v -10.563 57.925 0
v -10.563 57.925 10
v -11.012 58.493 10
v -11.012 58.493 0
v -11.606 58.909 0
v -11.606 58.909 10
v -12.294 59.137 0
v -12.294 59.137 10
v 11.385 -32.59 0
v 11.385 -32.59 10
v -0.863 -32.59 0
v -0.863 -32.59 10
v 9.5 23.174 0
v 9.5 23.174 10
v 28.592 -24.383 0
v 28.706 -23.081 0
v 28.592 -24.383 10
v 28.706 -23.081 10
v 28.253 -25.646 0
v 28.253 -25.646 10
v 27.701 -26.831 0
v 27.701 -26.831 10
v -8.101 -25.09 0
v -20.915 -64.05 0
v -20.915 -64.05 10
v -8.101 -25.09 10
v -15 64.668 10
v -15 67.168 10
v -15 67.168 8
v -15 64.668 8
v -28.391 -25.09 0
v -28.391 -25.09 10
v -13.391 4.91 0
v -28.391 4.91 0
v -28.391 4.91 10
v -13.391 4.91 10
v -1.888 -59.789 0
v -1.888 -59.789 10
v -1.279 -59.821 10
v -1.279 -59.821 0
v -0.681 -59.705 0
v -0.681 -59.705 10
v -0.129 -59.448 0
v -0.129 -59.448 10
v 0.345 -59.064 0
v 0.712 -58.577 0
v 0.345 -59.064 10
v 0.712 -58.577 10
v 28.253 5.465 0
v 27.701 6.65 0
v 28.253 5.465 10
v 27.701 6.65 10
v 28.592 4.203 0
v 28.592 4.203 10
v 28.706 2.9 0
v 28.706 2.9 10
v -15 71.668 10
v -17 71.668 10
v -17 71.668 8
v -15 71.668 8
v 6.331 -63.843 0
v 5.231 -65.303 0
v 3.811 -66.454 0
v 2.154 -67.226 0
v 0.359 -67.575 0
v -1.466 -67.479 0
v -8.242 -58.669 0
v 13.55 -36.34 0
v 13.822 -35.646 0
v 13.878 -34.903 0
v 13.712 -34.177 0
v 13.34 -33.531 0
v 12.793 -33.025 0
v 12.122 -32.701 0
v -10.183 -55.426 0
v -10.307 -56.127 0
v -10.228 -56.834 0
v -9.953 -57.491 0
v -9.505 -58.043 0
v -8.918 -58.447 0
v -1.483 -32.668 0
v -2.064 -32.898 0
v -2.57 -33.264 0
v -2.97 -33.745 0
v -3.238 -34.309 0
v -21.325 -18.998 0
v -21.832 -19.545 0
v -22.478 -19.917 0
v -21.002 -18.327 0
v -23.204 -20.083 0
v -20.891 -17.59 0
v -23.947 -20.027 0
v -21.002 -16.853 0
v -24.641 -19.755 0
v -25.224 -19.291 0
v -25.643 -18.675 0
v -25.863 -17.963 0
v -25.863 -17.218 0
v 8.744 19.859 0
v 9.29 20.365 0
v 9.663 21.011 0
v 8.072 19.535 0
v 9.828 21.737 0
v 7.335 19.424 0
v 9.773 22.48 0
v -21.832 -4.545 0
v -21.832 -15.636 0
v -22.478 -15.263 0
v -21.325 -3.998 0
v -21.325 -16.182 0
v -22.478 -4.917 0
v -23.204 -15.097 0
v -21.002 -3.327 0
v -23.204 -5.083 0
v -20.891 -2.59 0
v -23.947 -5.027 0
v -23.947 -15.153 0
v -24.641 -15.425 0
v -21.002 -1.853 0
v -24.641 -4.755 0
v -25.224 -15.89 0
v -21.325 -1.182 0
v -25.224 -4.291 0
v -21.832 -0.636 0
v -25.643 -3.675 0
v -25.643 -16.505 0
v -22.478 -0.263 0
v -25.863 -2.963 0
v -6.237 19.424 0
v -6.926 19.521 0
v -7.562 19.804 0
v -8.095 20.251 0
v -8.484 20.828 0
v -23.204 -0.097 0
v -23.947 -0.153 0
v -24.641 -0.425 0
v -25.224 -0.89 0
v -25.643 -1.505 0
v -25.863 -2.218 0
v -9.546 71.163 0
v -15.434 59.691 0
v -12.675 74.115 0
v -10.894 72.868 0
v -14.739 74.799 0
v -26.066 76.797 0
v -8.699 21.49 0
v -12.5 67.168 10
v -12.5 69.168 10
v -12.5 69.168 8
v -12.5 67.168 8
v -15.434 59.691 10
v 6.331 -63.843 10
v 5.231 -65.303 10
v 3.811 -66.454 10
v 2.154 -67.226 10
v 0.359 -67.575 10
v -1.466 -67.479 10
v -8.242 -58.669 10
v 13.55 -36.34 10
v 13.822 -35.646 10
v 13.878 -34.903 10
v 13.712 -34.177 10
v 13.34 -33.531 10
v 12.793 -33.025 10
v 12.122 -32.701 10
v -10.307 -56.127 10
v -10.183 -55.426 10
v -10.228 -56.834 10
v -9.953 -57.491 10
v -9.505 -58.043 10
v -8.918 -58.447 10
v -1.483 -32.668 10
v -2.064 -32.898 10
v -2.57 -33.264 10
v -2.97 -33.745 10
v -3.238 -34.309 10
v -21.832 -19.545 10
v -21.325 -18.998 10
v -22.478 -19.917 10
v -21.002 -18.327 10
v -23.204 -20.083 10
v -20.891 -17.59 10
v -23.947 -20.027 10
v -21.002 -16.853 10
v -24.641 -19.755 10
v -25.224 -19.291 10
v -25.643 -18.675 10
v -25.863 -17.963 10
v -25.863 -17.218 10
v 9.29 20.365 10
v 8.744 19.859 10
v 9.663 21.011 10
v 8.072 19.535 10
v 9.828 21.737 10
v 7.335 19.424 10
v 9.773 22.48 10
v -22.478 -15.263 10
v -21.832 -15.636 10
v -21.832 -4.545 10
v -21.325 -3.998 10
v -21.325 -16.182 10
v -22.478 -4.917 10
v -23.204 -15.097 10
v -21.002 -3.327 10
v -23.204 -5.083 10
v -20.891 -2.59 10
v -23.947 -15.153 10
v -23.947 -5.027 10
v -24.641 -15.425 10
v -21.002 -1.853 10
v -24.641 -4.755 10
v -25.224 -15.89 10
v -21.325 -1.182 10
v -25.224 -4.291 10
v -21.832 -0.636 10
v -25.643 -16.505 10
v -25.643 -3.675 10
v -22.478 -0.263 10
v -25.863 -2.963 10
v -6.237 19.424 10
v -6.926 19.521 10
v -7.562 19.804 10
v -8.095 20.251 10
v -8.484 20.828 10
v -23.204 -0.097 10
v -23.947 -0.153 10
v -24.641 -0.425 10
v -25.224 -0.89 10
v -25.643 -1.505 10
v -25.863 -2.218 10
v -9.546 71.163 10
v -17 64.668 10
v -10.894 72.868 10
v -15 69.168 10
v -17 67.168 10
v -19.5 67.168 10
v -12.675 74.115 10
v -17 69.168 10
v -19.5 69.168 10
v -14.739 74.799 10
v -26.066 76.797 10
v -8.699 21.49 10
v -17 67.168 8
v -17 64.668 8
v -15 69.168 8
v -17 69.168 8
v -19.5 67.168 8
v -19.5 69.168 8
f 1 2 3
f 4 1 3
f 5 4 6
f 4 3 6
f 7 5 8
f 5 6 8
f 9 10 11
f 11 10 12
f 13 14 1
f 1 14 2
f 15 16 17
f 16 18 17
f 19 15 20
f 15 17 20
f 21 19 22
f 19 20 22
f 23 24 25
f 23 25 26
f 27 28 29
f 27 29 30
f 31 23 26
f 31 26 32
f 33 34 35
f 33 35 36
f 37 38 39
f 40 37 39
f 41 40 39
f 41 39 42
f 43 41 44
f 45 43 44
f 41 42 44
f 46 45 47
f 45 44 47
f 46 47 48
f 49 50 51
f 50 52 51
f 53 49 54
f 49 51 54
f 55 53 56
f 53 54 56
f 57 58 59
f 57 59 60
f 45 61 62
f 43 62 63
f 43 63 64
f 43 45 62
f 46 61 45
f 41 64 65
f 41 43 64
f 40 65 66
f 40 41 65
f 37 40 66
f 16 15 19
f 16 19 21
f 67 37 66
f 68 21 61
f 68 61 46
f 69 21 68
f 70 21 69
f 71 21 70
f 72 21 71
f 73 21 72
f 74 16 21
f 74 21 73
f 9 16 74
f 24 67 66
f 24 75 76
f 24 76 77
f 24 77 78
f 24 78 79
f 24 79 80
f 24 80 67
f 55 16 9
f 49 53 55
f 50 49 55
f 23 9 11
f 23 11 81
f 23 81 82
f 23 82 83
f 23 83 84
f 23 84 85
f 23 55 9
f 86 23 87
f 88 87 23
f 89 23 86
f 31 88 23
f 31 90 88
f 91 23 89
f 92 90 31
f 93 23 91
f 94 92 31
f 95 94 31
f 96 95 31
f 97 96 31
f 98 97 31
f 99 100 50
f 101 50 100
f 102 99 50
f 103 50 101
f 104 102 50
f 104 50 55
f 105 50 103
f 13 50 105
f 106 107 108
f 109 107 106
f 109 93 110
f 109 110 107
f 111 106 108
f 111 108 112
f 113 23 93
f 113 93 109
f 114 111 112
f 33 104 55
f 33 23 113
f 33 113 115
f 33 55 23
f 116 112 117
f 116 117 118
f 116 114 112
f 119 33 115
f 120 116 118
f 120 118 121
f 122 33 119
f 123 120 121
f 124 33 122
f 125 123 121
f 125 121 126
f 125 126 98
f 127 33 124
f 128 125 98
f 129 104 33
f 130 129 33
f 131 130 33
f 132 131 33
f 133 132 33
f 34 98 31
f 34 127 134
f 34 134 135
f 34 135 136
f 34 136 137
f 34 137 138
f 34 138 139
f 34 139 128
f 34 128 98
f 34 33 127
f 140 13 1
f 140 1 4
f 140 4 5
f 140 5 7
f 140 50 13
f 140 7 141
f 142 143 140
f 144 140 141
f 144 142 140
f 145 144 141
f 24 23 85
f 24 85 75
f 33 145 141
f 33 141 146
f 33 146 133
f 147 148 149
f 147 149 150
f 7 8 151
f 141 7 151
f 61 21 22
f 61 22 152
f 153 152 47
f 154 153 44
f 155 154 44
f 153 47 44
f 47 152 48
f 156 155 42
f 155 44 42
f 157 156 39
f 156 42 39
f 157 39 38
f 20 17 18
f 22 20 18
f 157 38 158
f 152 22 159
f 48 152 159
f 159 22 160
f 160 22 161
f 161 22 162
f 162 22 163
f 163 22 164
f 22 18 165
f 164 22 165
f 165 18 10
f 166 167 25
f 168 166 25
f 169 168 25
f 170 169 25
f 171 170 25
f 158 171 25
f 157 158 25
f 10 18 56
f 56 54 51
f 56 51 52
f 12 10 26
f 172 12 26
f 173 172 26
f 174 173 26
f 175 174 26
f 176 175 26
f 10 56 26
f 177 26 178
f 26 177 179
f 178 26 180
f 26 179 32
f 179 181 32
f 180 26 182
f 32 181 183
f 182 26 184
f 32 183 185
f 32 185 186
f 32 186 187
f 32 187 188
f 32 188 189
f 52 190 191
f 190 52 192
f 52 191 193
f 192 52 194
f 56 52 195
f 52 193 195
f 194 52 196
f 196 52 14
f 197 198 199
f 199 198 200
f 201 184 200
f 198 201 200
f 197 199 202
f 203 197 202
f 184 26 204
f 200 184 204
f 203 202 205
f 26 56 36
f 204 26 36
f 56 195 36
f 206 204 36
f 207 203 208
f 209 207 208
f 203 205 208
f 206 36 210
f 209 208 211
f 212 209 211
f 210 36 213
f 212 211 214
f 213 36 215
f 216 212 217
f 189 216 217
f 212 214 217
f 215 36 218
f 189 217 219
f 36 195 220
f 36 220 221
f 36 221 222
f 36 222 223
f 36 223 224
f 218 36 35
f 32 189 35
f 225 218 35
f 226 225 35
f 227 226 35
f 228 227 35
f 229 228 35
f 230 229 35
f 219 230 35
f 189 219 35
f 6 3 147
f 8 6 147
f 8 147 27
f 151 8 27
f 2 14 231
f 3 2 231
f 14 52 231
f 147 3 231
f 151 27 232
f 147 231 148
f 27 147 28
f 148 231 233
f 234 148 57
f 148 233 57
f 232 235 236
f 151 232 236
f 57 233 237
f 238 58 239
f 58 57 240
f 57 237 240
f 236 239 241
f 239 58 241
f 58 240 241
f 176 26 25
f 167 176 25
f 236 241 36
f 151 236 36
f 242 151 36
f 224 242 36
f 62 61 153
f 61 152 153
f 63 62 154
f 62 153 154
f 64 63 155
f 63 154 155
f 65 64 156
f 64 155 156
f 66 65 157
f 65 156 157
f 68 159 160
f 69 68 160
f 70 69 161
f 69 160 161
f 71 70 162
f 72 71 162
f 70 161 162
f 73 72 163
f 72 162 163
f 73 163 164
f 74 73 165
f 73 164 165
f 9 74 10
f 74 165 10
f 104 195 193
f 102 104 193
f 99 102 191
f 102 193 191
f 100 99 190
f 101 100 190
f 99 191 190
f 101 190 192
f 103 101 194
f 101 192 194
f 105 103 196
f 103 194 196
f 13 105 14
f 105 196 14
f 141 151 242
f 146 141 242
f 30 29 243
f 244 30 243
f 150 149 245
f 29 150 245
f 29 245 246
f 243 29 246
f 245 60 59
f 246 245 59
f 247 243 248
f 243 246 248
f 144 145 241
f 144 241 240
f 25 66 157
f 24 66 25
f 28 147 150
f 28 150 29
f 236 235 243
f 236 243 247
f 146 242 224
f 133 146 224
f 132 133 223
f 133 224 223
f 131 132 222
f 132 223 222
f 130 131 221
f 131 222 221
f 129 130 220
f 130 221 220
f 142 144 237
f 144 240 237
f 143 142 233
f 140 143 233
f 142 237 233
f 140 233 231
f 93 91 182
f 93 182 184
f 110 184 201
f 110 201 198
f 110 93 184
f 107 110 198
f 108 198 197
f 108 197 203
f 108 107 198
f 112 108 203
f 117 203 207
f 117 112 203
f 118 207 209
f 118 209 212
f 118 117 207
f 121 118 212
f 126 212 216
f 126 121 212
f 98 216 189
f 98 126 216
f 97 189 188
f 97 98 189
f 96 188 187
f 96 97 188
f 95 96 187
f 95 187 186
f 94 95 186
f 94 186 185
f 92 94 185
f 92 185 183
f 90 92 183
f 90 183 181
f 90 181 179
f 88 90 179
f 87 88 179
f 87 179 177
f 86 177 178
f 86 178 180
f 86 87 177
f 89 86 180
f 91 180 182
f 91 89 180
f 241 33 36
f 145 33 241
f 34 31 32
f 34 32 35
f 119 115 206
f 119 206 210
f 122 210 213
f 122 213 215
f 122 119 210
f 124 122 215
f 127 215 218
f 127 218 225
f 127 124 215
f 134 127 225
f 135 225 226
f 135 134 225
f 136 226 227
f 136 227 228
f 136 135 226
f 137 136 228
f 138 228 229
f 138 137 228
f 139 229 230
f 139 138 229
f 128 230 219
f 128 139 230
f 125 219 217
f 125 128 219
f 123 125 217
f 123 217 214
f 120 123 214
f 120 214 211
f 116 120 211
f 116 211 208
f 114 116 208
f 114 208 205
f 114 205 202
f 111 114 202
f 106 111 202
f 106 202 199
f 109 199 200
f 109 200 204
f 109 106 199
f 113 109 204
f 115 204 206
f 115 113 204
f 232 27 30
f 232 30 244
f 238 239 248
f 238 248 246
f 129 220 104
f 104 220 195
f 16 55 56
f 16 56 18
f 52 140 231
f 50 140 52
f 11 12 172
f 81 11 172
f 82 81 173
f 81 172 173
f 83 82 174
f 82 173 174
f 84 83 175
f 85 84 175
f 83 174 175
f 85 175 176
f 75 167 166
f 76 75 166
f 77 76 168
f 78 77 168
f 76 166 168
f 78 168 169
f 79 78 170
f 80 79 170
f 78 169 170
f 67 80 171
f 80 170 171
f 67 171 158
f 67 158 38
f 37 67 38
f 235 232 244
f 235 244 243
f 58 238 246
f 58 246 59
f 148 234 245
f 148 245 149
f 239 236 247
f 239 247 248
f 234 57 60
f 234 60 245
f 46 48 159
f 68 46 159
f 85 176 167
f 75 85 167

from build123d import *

# Parameters (mm, degrees)
IZIM1_R                     = 2.5
Y_KSEKLIK_EKSTR_ZYON1_DEPTH = 10
RADYUS1_R                   = 7.5
RADYUS2_R                   = 7.5
KES_EKSTR_ZYON1_DEPTH       = 10
KES_EKSTR_ZYON2_DEPTH       = 2


with BuildPart() as part:
    # Çizim1 → Yükseklik-Ekstrüzyon1 (new body)
    with BuildSketch(Plane.XY):
        Polygon((-26.066455833, 76.796612605), (-11.294339538, 74.19188994), (28.705660462, 4.909857637), (28.705660462, -25.090142363), (3.705660462, -68.391412552), (-20.914533363, -64.05020811), (-8.101071955, -25.090142363), (-28.390881377, -25.090142363), (-28.390881377, 4.909857637), (-13.390881377, 4.909857637), align=None)
        with Locations((-23.390881377, -2.590142363)):
            Circle(IZIM1_R, mode=Mode.SUBTRACT)
        with Locations((-23.390881377, -17.590142363)):
            Circle(IZIM1_R, mode=Mode.SUBTRACT)
    extrude(amount=Y_KSEKLIK_EKSTR_ZYON1_DEPTH)

    # Radyus1
    radyus1_edges = [part.edges().sort_by_distance(p)[0] for p in [
        (-11.294339538, 74.19188994, 5),
    ]]
    fillet(radyus1_edges, radius=RADYUS1_R)

    # Radyus2
    radyus2_edges = [part.edges().sort_by_distance(p)[0] for p in [
        (28.705660462, 4.909857637, 5),
        (28.705660462, -25.090142363, 5),
        (3.705660462, -68.391412552, 5),
    ]]
    fillet(radyus2_edges, radius=RADYUS2_R)

    # Çizim2 → Kes-Ekstrüzyon1 (cut)
    with BuildSketch(Plane.XY.offset(10)):
        with BuildLine():
            Line((-15.434488962, 59.690510809), (-8.698721777, 21.490076831))
            ThreePointArc((-8.698721777, 21.490076831), (-7.843671419, 20.009086168), (-6.236702395, 19.424197275))
            Line((-6.236702395, 19.424197275), (7.335421508, 19.424197275))
            ThreePointArc((7.335421508, 19.424197275), (9.500485018, 20.674197275), (9.500485018, 23.174197275))
            Line((9.500485018, 23.174197275), (-10.56271444, 57.924678099))
            ThreePointArc((-10.56271444, 57.924678099), (-11.293836859, 58.72255821), (-12.293657506, 59.136697482))
            Line((-12.293657506, 59.136697482), (-15.434488962, 59.690510809))
        make_face()
        with BuildLine():
            Line((-8.242164507, -58.66898906), (-1.887676329, -59.789456774))
            ThreePointArc((-1.887676329, -59.789456774), (-0.39701023, -59.593206859), (0.711507625, -58.577437392))
            Line((0.711507625, -58.577437392), (13.550215896, -36.340142363))
            ThreePointArc((13.550215896, -36.340142363), (13.550215896, -33.840142363), (11.385152387, -32.590142363))
            Line((11.385152387, -32.590142363), (-0.86299285, -32.590142363))
            ThreePointArc((-0.86299285, -32.590142363), (-2.328828905, -33.064969615), (-3.237849836, -34.309082635))
            Line((-3.237849836, -34.309082635), (-10.182901048, -55.42590995))
            ThreePointArc((-10.182901048, -55.42590995), (-9.953266447, -57.490722349), (-8.242164507, -58.66898906))
        make_face()
    extrude(amount=-KES_EKSTR_ZYON1_DEPTH, mode=Mode.SUBTRACT)

    # Çizim3 → Kes-Ekstrüzyon2 (cut)
    with BuildSketch(Plane.XY.offset(10)):
        Polygon((-17, 71.667807617), (-15, 71.667807617), (-15, 69.167807617), (-12.5, 69.167807617), (-12.5, 67.167807617), (-15, 67.167807617), (-15, 64.667807617), (-17, 64.667807617), (-17, 67.167807617), (-19.5, 67.167807617), (-19.5, 69.167807617), (-17, 69.167807617), align=None)
    extrude(amount=-KES_EKSTR_ZYON2_DEPTH, mode=Mode.SUBTRACT)


solid = part.part
